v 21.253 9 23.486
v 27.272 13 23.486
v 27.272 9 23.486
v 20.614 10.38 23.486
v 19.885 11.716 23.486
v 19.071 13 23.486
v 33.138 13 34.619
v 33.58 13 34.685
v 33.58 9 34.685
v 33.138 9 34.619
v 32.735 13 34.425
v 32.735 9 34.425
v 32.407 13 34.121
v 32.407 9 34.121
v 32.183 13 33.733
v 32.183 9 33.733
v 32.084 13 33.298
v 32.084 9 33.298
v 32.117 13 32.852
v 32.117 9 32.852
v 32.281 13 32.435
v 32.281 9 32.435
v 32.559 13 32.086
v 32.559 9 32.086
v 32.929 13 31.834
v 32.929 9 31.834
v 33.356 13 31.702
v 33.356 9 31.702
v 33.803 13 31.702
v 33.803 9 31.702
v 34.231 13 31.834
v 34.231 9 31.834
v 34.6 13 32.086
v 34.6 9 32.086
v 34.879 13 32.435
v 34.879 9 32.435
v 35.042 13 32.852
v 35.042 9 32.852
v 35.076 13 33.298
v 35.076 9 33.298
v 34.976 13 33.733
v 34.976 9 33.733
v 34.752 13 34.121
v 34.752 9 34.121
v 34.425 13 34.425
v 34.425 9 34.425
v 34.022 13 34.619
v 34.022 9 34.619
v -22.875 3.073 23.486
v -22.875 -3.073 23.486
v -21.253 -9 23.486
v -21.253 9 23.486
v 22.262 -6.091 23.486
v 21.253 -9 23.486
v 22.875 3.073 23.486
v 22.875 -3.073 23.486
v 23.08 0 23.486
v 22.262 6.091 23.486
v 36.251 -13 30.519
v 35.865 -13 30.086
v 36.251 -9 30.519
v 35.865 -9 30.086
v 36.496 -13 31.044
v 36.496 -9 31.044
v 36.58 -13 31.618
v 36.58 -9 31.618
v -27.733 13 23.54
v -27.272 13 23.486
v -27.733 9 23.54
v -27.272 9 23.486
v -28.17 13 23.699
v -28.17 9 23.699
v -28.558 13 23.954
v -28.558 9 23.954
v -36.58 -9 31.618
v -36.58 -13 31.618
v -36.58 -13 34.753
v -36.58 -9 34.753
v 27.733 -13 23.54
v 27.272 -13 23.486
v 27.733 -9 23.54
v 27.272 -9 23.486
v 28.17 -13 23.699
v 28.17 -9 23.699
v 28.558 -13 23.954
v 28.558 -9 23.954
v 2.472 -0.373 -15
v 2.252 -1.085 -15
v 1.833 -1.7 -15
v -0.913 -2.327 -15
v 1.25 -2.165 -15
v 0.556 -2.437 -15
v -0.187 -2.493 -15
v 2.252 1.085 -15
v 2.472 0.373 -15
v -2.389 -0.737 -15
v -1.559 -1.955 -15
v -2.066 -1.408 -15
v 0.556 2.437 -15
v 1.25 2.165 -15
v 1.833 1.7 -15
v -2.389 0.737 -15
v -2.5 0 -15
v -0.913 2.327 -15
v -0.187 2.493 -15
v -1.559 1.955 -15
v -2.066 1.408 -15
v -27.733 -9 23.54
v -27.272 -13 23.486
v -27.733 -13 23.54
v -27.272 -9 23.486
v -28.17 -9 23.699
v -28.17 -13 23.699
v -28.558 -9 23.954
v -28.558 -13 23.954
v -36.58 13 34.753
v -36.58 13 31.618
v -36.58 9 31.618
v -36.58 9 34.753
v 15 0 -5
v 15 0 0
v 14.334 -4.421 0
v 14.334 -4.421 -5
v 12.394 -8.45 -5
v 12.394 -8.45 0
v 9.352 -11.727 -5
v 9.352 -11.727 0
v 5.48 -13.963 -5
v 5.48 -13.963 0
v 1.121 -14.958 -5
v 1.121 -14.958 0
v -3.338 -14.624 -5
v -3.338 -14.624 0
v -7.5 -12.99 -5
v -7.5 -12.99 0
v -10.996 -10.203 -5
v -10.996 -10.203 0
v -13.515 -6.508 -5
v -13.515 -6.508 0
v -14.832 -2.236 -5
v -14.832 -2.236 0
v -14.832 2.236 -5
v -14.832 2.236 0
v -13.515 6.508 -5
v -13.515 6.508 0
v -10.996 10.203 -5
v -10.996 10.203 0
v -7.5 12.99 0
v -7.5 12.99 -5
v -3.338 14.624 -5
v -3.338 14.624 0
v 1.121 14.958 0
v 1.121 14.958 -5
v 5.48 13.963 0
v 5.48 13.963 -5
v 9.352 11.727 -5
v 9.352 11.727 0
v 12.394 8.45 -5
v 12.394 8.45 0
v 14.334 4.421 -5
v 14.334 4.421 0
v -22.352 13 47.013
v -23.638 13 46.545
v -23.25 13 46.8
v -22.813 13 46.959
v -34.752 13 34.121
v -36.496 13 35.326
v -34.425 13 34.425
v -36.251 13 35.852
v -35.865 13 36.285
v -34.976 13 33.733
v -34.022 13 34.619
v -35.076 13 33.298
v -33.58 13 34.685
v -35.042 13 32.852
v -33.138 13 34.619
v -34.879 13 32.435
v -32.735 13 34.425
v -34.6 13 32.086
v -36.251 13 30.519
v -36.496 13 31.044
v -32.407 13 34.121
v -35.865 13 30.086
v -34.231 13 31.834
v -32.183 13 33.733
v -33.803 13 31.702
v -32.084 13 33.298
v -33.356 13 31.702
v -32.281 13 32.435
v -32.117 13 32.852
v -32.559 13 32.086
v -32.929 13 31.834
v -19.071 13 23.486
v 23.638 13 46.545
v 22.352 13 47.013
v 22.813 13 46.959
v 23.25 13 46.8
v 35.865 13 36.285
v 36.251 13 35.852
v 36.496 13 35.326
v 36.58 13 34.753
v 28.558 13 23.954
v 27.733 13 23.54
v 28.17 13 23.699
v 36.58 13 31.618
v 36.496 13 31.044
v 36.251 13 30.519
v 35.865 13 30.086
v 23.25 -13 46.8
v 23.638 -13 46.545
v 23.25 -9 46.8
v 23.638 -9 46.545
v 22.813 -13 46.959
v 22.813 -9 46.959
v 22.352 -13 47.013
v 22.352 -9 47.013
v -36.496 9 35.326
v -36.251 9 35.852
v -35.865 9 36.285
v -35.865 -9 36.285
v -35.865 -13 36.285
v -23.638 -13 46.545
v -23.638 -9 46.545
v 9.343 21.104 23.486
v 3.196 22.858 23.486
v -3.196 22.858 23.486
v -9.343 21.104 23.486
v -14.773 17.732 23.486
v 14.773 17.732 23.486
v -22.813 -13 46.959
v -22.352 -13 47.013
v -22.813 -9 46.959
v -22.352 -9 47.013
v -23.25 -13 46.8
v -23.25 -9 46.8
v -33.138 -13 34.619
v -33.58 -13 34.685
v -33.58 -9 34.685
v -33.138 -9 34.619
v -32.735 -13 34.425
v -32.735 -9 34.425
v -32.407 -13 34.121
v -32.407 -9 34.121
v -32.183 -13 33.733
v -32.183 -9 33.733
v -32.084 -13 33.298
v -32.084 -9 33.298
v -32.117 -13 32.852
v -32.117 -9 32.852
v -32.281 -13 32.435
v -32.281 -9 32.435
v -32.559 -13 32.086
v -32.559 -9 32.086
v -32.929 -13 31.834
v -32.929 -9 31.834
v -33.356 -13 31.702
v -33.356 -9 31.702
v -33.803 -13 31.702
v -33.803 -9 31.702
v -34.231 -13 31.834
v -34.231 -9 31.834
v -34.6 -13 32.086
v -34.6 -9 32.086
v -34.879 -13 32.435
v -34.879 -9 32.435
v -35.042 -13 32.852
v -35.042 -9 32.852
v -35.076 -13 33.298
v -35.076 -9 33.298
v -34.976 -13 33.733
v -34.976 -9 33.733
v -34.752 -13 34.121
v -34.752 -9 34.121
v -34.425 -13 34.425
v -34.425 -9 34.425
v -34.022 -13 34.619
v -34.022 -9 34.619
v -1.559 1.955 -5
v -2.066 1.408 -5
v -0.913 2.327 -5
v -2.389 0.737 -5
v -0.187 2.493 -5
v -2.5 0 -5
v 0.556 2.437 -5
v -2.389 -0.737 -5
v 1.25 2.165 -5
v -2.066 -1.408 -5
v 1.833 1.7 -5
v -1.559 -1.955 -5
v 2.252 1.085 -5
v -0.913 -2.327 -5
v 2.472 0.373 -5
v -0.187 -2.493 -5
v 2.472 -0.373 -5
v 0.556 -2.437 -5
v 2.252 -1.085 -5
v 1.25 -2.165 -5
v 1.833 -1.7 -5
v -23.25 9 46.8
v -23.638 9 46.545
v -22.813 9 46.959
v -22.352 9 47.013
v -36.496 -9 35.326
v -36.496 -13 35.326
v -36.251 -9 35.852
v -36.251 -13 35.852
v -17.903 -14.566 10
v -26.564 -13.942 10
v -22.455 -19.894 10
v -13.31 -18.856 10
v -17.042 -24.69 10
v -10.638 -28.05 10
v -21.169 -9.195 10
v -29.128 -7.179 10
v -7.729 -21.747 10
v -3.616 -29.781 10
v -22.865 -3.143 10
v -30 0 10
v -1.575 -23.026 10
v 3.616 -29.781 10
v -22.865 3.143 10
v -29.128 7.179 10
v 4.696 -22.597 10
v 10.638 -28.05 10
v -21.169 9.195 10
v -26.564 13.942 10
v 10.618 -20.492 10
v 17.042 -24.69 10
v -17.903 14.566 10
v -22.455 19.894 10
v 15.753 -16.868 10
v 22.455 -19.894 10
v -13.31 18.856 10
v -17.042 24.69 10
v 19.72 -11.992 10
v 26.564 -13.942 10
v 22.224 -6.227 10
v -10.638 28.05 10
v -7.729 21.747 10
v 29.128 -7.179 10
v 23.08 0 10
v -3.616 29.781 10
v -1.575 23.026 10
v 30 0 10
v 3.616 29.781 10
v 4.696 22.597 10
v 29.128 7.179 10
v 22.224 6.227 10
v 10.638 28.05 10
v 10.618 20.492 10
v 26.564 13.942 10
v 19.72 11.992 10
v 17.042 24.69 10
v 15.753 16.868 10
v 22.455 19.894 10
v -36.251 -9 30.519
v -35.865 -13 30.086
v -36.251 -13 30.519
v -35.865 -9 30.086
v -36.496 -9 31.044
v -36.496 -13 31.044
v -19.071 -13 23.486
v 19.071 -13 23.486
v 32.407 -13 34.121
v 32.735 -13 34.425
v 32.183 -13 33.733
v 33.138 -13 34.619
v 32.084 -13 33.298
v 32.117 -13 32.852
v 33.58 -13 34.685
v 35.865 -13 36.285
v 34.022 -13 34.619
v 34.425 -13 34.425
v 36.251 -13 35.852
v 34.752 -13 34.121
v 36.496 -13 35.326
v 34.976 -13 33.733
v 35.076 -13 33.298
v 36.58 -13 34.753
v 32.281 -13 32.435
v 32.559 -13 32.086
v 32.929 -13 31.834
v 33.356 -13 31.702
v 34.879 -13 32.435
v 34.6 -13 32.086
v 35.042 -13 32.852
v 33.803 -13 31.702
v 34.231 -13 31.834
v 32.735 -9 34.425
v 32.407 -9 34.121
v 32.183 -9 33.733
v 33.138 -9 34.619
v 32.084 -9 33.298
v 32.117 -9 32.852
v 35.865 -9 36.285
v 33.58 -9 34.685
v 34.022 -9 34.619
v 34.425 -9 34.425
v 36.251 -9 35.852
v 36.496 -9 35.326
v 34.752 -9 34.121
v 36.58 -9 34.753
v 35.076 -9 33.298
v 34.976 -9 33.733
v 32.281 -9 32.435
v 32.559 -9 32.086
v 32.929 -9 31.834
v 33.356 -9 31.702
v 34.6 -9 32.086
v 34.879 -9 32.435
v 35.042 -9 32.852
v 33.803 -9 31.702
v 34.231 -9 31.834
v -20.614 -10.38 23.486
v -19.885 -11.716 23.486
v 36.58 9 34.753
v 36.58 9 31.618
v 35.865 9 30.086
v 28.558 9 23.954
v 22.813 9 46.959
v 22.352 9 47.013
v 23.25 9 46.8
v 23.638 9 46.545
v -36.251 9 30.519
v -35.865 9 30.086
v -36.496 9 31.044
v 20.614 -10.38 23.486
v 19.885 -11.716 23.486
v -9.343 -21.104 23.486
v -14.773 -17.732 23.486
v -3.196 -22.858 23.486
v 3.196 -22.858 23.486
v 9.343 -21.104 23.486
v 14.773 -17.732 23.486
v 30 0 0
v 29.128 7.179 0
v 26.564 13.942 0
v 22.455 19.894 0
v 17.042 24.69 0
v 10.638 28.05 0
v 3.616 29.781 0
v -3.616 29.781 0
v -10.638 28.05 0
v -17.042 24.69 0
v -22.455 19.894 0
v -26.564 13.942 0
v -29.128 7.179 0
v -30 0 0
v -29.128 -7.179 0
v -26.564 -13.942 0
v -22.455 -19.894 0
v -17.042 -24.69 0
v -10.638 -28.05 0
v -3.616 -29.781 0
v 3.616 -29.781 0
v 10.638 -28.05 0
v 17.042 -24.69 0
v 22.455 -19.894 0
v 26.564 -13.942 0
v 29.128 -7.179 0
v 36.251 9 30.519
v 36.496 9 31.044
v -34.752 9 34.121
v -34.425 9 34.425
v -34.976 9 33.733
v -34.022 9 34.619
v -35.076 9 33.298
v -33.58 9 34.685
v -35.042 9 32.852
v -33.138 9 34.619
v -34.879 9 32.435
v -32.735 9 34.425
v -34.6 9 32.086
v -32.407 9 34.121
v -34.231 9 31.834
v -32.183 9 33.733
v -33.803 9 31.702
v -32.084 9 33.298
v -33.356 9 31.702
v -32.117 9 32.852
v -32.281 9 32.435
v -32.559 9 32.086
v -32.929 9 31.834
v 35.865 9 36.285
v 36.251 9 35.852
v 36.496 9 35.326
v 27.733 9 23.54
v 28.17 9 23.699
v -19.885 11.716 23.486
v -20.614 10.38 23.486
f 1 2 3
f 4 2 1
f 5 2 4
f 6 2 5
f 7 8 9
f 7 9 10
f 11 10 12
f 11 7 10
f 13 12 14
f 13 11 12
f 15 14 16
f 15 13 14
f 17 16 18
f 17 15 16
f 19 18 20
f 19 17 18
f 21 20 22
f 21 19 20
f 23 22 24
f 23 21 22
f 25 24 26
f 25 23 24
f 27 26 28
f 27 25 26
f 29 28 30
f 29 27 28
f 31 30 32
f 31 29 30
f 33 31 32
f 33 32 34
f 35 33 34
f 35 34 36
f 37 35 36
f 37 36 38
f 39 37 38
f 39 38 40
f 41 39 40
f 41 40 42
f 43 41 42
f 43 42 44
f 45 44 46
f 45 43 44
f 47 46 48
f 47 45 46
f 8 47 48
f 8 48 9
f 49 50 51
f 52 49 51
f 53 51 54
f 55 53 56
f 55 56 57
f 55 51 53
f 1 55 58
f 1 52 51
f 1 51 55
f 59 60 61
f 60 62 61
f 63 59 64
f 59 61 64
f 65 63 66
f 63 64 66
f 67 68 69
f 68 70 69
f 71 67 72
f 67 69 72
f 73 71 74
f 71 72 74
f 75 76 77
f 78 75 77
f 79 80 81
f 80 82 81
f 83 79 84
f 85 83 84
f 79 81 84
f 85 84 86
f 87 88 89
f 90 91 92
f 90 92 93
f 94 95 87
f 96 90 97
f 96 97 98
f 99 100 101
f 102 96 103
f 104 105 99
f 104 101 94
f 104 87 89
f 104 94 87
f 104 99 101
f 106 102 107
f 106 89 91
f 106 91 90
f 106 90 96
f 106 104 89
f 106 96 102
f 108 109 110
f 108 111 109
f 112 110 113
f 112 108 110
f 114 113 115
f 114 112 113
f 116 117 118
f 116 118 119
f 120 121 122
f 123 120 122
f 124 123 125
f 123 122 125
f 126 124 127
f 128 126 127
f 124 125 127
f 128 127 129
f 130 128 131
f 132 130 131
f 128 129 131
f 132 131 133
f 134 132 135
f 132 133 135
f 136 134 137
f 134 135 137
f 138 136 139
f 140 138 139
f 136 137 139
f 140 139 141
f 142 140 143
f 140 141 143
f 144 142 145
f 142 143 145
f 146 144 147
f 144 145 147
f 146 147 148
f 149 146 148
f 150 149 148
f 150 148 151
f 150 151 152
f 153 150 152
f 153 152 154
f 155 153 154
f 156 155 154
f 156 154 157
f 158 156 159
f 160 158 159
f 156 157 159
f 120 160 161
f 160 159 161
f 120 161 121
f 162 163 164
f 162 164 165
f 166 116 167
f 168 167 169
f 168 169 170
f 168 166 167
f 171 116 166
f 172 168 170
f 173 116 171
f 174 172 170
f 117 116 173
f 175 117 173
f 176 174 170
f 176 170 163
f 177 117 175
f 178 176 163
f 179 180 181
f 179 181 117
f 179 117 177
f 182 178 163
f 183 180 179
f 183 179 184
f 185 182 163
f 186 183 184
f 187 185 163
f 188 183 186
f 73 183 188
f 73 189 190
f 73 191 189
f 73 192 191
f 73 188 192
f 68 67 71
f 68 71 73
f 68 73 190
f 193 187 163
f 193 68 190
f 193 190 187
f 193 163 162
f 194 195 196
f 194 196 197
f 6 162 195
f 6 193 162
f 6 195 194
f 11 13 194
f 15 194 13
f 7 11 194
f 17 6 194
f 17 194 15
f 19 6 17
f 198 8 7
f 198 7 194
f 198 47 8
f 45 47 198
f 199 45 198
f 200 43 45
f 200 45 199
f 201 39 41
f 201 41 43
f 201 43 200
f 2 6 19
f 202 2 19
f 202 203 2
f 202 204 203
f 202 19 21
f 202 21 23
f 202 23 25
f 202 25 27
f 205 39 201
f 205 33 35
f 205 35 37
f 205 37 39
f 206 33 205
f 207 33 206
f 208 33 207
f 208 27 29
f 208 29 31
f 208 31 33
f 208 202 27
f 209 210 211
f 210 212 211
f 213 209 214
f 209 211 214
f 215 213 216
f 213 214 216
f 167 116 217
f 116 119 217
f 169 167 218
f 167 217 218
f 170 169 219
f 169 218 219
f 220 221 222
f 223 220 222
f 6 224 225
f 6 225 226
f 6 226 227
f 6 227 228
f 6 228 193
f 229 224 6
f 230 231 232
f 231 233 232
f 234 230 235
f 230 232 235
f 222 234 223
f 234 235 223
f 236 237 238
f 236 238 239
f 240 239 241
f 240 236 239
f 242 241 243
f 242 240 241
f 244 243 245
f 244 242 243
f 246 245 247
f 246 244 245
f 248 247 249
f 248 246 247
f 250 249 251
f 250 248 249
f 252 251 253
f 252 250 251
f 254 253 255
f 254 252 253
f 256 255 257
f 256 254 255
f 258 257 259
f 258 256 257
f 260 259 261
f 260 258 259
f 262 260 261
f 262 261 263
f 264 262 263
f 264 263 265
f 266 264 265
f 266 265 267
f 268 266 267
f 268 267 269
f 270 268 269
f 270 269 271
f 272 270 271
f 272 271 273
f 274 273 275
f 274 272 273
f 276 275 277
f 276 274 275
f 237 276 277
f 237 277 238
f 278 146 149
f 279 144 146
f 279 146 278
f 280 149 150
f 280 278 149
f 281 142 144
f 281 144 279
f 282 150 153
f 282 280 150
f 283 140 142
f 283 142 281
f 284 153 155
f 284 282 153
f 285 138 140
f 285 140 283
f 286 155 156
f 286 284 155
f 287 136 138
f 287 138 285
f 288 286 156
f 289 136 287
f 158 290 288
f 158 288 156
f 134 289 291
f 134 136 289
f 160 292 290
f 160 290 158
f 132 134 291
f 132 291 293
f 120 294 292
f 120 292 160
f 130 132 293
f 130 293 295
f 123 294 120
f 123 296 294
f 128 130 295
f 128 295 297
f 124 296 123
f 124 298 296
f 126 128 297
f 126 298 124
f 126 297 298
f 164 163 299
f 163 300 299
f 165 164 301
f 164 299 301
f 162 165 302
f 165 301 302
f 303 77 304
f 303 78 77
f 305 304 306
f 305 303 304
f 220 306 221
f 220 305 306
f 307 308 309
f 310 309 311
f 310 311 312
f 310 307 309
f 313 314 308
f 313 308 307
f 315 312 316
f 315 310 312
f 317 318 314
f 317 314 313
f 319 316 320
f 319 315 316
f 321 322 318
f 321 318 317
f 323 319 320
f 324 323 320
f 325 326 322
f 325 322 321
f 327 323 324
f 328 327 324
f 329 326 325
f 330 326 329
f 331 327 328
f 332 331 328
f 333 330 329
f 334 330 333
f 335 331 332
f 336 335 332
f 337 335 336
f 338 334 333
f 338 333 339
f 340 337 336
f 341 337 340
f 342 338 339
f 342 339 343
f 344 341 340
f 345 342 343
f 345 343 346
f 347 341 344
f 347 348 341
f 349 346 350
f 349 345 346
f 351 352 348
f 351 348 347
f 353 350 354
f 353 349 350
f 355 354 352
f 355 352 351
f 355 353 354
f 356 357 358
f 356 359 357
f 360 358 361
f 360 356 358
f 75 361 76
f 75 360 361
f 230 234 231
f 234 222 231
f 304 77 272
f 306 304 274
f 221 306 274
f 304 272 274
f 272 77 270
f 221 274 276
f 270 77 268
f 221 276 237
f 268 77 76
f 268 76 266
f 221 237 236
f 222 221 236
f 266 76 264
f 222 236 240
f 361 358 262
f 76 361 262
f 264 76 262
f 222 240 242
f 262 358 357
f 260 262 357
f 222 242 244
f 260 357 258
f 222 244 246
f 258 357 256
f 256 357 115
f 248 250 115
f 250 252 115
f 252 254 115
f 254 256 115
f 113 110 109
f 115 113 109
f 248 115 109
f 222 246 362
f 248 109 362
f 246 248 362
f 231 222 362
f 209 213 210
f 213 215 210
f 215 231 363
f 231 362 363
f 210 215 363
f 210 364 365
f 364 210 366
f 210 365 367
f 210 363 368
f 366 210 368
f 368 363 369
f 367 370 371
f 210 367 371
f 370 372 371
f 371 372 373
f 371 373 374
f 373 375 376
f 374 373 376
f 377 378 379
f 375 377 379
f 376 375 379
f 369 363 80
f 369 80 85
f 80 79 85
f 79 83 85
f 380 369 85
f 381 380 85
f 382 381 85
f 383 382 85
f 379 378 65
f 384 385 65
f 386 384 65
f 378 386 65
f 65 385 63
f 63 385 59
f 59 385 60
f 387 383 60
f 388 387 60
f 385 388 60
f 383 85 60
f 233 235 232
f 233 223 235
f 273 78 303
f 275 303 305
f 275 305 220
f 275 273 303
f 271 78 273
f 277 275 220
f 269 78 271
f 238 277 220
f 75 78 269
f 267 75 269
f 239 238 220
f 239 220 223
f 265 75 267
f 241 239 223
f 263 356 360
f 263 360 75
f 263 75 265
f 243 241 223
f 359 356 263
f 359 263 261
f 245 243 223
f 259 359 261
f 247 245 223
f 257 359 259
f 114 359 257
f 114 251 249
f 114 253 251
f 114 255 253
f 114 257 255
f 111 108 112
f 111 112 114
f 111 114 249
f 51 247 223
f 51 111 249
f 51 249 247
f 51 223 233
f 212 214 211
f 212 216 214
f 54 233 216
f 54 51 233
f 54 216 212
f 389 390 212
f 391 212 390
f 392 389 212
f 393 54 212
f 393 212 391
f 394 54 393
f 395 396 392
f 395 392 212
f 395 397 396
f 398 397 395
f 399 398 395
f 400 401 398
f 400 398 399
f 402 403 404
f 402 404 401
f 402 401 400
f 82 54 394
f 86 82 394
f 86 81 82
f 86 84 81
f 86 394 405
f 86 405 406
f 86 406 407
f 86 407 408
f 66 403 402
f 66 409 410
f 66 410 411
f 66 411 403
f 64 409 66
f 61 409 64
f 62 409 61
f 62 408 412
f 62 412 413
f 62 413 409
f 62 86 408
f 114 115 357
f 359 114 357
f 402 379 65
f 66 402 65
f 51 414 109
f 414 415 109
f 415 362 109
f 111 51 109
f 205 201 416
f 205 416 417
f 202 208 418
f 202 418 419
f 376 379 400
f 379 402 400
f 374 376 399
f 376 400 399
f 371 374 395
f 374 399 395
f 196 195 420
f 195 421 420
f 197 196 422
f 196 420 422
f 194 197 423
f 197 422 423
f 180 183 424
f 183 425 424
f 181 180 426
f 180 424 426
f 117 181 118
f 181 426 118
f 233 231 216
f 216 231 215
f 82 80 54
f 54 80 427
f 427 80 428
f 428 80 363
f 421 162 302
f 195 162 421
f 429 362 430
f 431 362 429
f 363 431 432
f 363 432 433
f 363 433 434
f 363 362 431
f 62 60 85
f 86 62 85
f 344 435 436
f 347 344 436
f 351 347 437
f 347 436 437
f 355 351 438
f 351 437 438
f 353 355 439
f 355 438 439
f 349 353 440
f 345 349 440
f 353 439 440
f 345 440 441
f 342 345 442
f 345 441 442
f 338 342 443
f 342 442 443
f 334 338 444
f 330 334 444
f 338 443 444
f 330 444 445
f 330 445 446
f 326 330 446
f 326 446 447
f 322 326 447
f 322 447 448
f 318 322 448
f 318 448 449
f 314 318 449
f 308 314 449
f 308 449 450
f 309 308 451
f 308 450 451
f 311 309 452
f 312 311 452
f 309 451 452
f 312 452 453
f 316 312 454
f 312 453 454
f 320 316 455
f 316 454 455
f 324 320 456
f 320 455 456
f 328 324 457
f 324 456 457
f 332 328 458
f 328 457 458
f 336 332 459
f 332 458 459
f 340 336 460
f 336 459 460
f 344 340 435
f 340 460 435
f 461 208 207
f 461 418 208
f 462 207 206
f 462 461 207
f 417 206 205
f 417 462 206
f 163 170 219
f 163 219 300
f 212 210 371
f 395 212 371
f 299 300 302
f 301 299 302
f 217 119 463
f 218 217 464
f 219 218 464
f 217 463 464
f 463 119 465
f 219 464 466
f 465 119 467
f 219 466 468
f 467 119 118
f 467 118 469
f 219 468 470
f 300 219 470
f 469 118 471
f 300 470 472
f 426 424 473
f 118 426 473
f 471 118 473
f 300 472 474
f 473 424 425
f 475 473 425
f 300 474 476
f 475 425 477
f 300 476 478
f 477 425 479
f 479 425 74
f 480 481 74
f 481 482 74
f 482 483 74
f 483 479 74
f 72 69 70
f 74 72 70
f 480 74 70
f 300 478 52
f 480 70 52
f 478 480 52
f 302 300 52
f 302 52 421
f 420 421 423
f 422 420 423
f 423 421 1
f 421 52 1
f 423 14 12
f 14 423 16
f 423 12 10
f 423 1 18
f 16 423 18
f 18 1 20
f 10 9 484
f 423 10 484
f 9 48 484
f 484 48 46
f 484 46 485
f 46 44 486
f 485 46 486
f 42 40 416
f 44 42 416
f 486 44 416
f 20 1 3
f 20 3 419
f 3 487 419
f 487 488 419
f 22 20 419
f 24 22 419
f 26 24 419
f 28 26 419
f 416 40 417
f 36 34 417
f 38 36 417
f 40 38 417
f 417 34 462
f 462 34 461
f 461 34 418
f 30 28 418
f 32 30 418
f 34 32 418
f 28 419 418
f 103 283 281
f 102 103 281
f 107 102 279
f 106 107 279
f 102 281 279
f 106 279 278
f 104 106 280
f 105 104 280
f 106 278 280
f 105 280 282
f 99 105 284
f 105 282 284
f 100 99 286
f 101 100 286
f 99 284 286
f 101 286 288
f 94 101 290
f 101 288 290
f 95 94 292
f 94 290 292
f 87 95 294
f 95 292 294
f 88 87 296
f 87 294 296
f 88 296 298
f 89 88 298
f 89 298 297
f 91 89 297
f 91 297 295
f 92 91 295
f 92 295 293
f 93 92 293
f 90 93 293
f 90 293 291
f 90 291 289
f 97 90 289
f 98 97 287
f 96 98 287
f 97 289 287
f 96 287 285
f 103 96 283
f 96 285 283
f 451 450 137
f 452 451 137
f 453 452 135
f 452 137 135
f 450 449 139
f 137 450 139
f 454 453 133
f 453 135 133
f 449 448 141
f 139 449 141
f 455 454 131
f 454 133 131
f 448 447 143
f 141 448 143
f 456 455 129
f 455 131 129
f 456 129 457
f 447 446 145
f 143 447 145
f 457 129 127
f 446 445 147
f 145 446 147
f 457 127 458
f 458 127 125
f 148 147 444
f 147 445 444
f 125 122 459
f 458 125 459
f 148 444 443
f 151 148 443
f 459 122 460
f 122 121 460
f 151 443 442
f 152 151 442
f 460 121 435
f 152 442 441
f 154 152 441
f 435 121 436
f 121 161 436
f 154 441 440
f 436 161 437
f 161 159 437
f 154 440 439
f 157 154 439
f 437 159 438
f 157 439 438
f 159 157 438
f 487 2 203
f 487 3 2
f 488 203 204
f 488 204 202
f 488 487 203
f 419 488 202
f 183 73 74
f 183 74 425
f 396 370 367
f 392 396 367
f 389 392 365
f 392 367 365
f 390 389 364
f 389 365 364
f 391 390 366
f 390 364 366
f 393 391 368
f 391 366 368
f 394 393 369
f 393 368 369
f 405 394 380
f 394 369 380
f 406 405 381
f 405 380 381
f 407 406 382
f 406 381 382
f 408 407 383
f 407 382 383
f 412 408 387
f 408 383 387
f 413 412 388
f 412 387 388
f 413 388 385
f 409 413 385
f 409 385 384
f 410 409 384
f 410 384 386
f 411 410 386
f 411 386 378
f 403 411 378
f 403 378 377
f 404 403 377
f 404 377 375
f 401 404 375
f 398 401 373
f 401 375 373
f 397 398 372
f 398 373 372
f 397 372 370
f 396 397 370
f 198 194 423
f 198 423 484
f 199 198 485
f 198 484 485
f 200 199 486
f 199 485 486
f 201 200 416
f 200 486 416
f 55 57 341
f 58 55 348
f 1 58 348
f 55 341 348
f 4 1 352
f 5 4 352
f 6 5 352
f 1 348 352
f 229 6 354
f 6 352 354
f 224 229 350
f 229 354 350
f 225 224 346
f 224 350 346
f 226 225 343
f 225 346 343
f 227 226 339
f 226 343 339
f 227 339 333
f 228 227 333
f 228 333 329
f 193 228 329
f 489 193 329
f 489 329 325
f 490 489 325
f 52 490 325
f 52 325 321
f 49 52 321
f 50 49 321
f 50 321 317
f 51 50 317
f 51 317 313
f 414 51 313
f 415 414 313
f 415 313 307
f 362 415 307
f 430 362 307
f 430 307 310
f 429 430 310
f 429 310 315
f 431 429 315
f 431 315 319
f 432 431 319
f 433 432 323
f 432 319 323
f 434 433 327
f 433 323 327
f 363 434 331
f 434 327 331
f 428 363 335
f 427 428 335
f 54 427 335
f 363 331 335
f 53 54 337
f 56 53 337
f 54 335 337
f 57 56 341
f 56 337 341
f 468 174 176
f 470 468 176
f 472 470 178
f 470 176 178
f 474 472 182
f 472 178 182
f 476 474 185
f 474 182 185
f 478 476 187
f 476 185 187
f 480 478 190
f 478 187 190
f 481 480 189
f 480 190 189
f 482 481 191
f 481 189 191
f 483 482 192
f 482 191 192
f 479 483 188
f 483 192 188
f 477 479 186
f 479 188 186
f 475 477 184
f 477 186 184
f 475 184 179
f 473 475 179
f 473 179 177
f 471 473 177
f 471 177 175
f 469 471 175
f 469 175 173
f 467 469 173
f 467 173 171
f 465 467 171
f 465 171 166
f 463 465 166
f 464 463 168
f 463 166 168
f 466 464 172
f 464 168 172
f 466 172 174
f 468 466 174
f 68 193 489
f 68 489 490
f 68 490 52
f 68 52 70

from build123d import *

# Parameters (mm, degrees)
SKETCH1_R               = 30
BOSS_EXTRUDE1_DEPTH     = 10
SKETCH2_R               = 23.08
BOSS_EXTRUDE2_DEPTH     = 13.486192569
BOSS_EXTRUDE3_DEPTH     = 4
FILLET1_R               = 2
SKETCH5_R               = 1.5
CUT_EXTRUDE1_DEPTH      = 4
MIRROR2_COPY_1_SKETCH_R = 1.5
MIRROR2_COPY_1_DEPTH    = 4
FILLET1_OF_MIRROR2_R    = 2
SKETCH8_R               = 15
BOSS_EXTRUDE4_DEPTH     = 5
SKETCH13_R              = 2.5
BOSS_EXTRUDE6_DEPTH     = 10


with BuildPart() as part:
    # Sketch1 → Boss-Extrude1 (new body)
    with BuildSketch(Plane.XY):
        Circle(SKETCH1_R)
    extrude(amount=BOSS_EXTRUDE1_DEPTH)

    # Sketch2 → Boss-Extrude2 (add)
    with BuildSketch(Plane.XY.offset(10)):
        Circle(SKETCH2_R)
    extrude(amount=BOSS_EXTRUDE2_DEPTH)

    # Sketch4 → Boss-Extrude3 (add)
    with BuildSketch(Plane(origin=(0, 13, 0), x_dir=(1, 0, 0), z_dir=(0, 1, 0))):
        Polygon((28, -23.486192569), (-28, -23.486192569), (-36.579697763, -30.685413797), (-36.579697763, -35.685413797), (-23.08, -47.013005211), (23.08, -47.013005211), (36.579697763, -35.685413797), (36.579697763, -30.685413797), align=None)
    boss_extrude3 = extrude(amount=-BOSS_EXTRUDE3_DEPTH)

    # Fillet1
    fillet1_edges = [part.edges().sort_by_distance(p)[0] for p in [
        (-36.579697763, 11, 30.685413797),
        (-28, 11, 23.486192569),
        (28, 11, 23.486192569),
        (36.579697763, 11, 30.685413797),
        (36.579697763, 11, 35.685413797),
        (23.08, 11, 47.013005211),
        (-23.08, 11, 47.013005211),
        (-36.579697763, 11, 35.685413797),
    ]]
    fillet(fillet1_edges, radius=FILLET1_R)

    # Sketch5 → Cut-Extrude1 (cut)
    with BuildSketch(Plane(origin=(0, 13, 0), x_dir=(1, 0, 0), z_dir=(0, 1, 0))):
        with Locations(Location((-33.579697763, -33.185413797, 0), (0, 0, 270))):
            Circle(SKETCH5_R)
    cut_extrude1 = extrude(amount=-CUT_EXTRUDE1_DEPTH, mode=Mode.SUBTRACT)

    # Mirror1: Cut-Extrude1 across plane
    add(cut_extrude1.mirror(Plane(origin=(0, 0, 0), x_dir=(0, 0, 1), z_dir=(1, 0, 0))), mode=Mode.SUBTRACT)

    # Mirror2: Boss-Extrude3, Cut-Extrude1 across plane
    add(boss_extrude3.mirror(Plane.ZX))
    add(cut_extrude1.mirror(Plane.ZX), mode=Mode.SUBTRACT)

    # Mirror2 copy 1 sketch → Mirror2 copy 1 (cut)
    with BuildSketch(Plane(origin=(0, -13, 0), x_dir=(-1, 0, 0), z_dir=(0, -1, 0))):
        with Locations(Location((-33.579697763, -33.185413797, 0), (0, 0, 270))):
            Circle(MIRROR2_COPY_1_SKETCH_R)
    extrude(amount=-MIRROR2_COPY_1_DEPTH, mode=Mode.SUBTRACT)

    # Fillet1 of Mirror2
    fillet1_of_mirror2_edges = [part.edges().sort_by_distance(p)[0] for p in [
        (-36.579697763, -11, 30.685413797),
        (-28, -11, 23.486192569),
        (28, -11, 23.486192569),
        (36.579697763, -11, 30.685413797),
        (36.579697763, -11, 35.685413797),
        (23.08, -11, 47.013005211),
        (-23.08, -11, 47.013005211),
        (-36.579697763, -11, 35.685413797),
    ]]
    fillet(fillet1_of_mirror2_edges, radius=FILLET1_OF_MIRROR2_R)

    # Sketch8 → Boss-Extrude4 (add)
    with BuildSketch(Plane(origin=(0, 0, 0), x_dir=(-1, 0, 0), z_dir=(0, 0, -1))):
        with Locations(Location((0, 0, 0), (0, 0, 180))):
            Circle(SKETCH8_R)
    extrude(amount=BOSS_EXTRUDE4_DEPTH)

    # Sketch13 → Boss-Extrude6 (add)
    with BuildSketch(Plane(origin=(0, 0, -5), x_dir=(-1, 0, 0), z_dir=(0, 0, -1))):
        Circle(SKETCH13_R)
    extrude(amount=BOSS_EXTRUDE6_DEPTH)


solid = part.part
